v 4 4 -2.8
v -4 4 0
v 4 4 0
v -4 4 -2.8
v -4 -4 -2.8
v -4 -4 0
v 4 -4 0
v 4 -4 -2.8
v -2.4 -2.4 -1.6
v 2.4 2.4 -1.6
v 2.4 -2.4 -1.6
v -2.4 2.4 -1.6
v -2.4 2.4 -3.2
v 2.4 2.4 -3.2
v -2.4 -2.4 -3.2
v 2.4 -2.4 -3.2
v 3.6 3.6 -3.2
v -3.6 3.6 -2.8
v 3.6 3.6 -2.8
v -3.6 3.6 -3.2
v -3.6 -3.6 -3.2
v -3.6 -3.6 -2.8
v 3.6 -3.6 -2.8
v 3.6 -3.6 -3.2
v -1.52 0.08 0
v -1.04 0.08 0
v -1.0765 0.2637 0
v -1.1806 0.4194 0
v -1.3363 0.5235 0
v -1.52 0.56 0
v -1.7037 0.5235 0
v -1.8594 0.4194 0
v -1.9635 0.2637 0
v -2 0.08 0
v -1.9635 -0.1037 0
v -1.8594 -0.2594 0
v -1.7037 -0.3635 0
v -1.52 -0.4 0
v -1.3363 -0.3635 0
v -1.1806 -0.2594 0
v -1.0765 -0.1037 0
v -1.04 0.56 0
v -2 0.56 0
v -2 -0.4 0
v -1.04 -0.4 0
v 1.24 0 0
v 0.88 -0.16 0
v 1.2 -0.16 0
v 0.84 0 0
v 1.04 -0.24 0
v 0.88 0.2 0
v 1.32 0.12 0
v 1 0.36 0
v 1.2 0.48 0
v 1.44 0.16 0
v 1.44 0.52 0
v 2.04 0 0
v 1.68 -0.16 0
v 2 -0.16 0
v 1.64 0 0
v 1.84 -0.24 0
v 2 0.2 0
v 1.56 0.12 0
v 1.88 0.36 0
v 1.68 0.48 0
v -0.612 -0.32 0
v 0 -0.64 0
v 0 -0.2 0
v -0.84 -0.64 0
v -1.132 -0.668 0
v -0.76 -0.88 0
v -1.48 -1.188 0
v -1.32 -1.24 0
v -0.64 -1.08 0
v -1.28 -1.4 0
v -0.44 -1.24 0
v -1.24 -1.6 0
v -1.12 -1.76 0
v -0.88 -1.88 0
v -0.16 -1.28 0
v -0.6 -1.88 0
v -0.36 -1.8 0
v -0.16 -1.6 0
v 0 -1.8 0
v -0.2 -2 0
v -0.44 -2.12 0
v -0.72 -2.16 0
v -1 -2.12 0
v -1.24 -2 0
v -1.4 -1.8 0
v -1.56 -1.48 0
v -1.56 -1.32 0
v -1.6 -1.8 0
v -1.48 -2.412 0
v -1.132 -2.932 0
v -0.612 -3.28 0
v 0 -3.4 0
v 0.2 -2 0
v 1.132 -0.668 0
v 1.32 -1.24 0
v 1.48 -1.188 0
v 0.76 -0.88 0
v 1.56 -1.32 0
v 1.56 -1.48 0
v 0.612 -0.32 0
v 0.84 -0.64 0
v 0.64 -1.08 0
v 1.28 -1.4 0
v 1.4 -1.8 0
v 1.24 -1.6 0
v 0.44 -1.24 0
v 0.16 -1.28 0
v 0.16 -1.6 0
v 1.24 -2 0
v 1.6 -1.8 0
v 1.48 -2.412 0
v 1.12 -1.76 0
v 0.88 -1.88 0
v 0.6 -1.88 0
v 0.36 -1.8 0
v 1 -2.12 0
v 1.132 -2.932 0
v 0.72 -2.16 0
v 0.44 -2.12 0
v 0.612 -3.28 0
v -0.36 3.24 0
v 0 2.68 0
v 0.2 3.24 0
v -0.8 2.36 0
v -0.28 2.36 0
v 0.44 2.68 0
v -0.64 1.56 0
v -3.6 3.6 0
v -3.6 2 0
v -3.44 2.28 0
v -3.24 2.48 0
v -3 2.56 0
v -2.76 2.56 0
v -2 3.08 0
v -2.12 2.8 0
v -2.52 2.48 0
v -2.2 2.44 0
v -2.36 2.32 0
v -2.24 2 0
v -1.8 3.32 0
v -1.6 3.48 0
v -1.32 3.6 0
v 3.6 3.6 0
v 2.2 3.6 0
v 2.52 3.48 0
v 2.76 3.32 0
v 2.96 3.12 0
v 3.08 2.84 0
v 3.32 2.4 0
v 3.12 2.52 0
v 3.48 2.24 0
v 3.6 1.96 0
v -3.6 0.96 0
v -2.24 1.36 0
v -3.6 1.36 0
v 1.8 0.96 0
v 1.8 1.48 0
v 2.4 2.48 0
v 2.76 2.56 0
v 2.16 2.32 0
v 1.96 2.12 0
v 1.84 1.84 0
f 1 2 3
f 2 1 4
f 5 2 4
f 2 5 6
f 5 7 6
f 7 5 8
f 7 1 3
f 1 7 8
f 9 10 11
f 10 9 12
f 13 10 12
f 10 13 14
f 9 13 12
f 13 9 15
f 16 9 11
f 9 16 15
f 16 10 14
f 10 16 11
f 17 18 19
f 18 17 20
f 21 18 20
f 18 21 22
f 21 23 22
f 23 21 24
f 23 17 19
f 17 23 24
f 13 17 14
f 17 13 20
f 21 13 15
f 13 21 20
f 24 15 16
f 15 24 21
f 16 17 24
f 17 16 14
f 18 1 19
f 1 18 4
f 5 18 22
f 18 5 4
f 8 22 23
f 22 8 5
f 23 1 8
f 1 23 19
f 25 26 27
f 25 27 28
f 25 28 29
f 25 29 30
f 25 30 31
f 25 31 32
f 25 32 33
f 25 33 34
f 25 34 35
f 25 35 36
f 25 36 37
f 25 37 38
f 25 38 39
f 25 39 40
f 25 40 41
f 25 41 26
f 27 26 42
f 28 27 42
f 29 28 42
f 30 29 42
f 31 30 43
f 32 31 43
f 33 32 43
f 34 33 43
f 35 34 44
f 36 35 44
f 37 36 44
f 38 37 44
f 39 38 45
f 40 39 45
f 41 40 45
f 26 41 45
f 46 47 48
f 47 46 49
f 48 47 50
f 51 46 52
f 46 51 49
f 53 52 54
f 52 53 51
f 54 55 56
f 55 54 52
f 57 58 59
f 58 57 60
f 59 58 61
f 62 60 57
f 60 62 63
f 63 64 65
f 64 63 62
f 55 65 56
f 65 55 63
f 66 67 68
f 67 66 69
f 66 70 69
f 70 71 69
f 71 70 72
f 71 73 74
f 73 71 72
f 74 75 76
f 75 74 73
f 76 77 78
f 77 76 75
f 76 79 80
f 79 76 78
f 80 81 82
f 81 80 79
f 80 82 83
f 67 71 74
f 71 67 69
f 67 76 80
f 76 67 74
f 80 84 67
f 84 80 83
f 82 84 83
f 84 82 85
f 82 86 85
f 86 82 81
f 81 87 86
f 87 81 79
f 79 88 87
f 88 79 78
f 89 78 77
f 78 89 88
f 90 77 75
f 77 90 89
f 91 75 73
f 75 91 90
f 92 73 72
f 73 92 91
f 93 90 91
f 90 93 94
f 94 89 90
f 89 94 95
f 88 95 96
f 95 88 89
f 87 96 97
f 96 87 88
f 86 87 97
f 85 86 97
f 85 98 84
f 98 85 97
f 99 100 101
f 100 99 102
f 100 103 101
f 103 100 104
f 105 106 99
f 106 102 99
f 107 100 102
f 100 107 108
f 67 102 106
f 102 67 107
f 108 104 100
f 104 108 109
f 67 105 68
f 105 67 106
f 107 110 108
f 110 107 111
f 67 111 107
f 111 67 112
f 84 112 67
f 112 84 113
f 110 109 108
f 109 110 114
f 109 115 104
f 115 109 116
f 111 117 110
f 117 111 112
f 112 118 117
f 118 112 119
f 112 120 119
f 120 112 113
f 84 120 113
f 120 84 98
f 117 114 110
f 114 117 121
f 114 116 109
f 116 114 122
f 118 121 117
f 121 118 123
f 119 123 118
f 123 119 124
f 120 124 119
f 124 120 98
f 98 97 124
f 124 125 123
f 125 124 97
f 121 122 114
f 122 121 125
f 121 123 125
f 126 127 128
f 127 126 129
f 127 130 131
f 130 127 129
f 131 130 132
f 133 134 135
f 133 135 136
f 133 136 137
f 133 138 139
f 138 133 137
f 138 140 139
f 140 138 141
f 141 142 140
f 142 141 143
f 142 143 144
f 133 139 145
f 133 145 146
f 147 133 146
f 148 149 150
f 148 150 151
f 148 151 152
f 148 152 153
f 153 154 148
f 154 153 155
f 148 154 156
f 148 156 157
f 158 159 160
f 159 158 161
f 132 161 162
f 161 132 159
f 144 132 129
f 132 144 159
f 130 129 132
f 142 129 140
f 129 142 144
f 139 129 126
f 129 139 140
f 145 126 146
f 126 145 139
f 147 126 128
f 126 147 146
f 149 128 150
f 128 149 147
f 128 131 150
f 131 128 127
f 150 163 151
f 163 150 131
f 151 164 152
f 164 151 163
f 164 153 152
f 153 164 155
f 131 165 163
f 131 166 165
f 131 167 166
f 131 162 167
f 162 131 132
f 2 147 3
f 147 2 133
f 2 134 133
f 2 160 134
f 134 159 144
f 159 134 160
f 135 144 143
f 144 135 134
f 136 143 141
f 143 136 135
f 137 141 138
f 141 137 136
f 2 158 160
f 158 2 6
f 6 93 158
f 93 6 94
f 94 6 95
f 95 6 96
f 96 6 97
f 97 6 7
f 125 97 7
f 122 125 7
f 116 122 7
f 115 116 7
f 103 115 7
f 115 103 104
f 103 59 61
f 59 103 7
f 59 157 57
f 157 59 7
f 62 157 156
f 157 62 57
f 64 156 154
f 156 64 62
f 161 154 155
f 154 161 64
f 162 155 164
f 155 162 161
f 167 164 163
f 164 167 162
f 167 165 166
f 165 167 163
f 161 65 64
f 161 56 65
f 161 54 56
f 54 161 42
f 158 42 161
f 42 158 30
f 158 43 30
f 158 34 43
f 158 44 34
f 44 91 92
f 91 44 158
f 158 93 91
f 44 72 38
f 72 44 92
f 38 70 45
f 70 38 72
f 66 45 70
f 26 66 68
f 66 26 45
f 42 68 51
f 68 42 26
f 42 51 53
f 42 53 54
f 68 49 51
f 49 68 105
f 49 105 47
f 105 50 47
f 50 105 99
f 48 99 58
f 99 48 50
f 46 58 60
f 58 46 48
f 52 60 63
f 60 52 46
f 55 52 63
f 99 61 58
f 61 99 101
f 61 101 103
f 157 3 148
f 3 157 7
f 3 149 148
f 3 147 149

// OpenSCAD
// file: ../p/box5.scad
use <../lib.scad>
function ldraw_lib__box5() = [
// 0 Box with 5 Faces and All Edges
// 0 Name: box5.dat
// 0 Author: James Jessiman
// 0 !LDRAW_ORG Primitive UPDATE 2012-01
// 0 !LICENSE Licensed under CC BY 4.0 : see CAreadme.txt
// 
// 0 BFC CERTIFY CCW
  [0,"BFC","CERTIFY"],
  [0,"BFC","CCW"],
// 
// 0 !HISTORY 2002-04-03 [sbliss] Modified for BFC compliance
// 0 !HISTORY 2002-04-25 [PTadmin] Official Update 2002-02
// 0 !HISTORY 2007-06-24 [PTadmin] Header formatted for Contributor Agreement
// 0 !HISTORY 2008-07-01 [PTadmin] Official Update 2008-01
// 0 !HISTORY 2012-02-16 [Philo] Changed to CCW
// 0 !HISTORY 2012-03-30 [PTadmin] Official Update 2012-01
// 
// 
// 2 24 1 1 1 -1 1 1
  [2,24,1,1,1,-1,1,1],
// 2 24 -1 1 1 -1 1 -1
  [2,24,-1,1,1,-1,1,-1],
// 2 24 -1 1 -1 1 1 -1
  [2,24,-1,1,-1,1,1,-1],
// 2 24 1 1 -1 1 1 1
  [2,24,1,1,-1,1,1,1],
// 2 24 1 0 1 -1 0 1
  [2,24,1,0,1,-1,0,1],
// 2 24 -1 0 1 -1 0 -1
  [2,24,-1,0,1,-1,0,-1],
// 2 24 -1 0 -1 1 0 -1
  [2,24,-1,0,-1,1,0,-1],
// 2 24 1 0 -1 1 0 1
  [2,24,1,0,-1,1,0,1],
// 2 24 1 0 1 1 1 1
  [2,24,1,0,1,1,1,1],
// 2 24 -1 0 1 -1 1 1
  [2,24,-1,0,1,-1,1,1],
// 2 24 1 0 -1 1 1 -1
  [2,24,1,0,-1,1,1,-1],
// 2 24 -1 0 -1 -1 1 -1
  [2,24,-1,0,-1,-1,1,-1],
// 4 16 -1 1 1 1 1 1 1 1 -1 -1 1 -1
  [4,16,-1,1,1,1,1,1,1,1,-1,-1,1,-1],
// 4 16 -1 1 1 -1 0 1 1 0 1 1 1 1
  [4,16,-1,1,1,-1,0,1,1,0,1,1,1,1],
// 4 16 -1 1 -1 -1 0 -1 -1 0 1 -1 1 1
  [4,16,-1,1,-1,-1,0,-1,-1,0,1,-1,1,1],
// 4 16 1 1 -1 1 0 -1 -1 0 -1 -1 1 -1
  [4,16,1,1,-1,1,0,-1,-1,0,-1,-1,1,-1],
// 4 16 1 1 1 1 0 1 1 0 -1 1 1 -1
  [4,16,1,1,1,1,0,1,1,0,-1,1,1,-1],
];
module ldraw_lib__box5(step=0, col=false, unit=2/5, alt=false, line=0.2, solid=!$preview)
    makepoly(ldraw_lib__box5(), step=step, col=col, unit=unit, alt=alt, line=line, solid=solid);
ldraw_lib__box5(line=0.2);
// file: ../p/box4.scad
use <../lib.scad>
function ldraw_lib__box4() = [
// 0 Box with 4 Faces (2 Parallel Pairs) and All Edges
// 0 Name: box4.dat
// 0 Author: James Jessiman
// 0 !LDRAW_ORG Primitive UPDATE 2012-01
// 0 !LICENSE Licensed under CC BY 4.0 : see CAreadme.txt
// 
// 0 BFC CERTIFY CCW
  [0,"BFC","CERTIFY"],
  [0,"BFC","CCW"],
// 
// 0 !HISTORY 2002-04-03 [sbliss] Modified for BFC compliance
// 0 !HISTORY 2002-04-25 [PTadmin] Official Update 2002-02
// 0 !HISTORY 2007-06-24 [PTadmin] Header formatted for Contributor Agreement
// 0 !HISTORY 2008-07-01 [PTadmin] Official Update 2008-01
// 0 !HISTORY 2012-02-16 [Philo] Changed to CCW
// 0 !HISTORY 2012-03-30 [PTadmin] Official Update 2012-01
// 
// 
// 2 24 1 1 1 -1 1 1
  [2,24,1,1,1,-1,1,1],
// 2 24 -1 1 1 -1 1 -1
  [2,24,-1,1,1,-1,1,-1],
// 2 24 -1 1 -1 1 1 -1
  [2,24,-1,1,-1,1,1,-1],
// 2 24 1 1 -1 1 1 1
  [2,24,1,1,-1,1,1,1],
// 2 24 1 0 1 -1 0 1
  [2,24,1,0,1,-1,0,1],
// 2 24 -1 0 1 -1 0 -1
  [2,24,-1,0,1,-1,0,-1],
// 2 24 -1 0 -1 1 0 -1
  [2,24,-1,0,-1,1,0,-1],
// 2 24 1 0 -1 1 0 1
  [2,24,1,0,-1,1,0,1],
// 2 24 1 0 1 1 1 1
  [2,24,1,0,1,1,1,1],
// 2 24 -1 0 1 -1 1 1
  [2,24,-1,0,1,-1,1,1],
// 2 24 1 0 -1 1 1 -1
  [2,24,1,0,-1,1,1,-1],
// 2 24 -1 0 -1 -1 1 -1
  [2,24,-1,0,-1,-1,1,-1],
// 4 16 -1 1 1 -1 0 1 1 0 1 1 1 1
  [4,16,-1,1,1,-1,0,1,1,0,1,1,1,1],
// 4 16 -1 1 -1 -1 0 -1 -1 0 1 -1 1 1
  [4,16,-1,1,-1,-1,0,-1,-1,0,1,-1,1,1],
// 4 16 1 1 -1 1 0 -1 -1 0 -1 -1 1 -1
  [4,16,1,1,-1,1,0,-1,-1,0,-1,-1,1,-1],
// 4 16 1 1 1 1 0 1 1 0 -1 1 1 -1
  [4,16,1,1,1,1,0,1,1,0,-1,1,1,-1],
];
module ldraw_lib__box4(step=0, col=false, unit=2/5, alt=false, line=0.2, solid=!$preview)
    makepoly(ldraw_lib__box4(), step=step, col=col, unit=unit, alt=alt, line=line, solid=solid);
ldraw_lib__box4(line=0.2);
// file: s/3070bs01.scad
use <../../lib.scad>
use <../../p/box4.scad>
use <../../p/box5.scad>
function ldraw_lib__s__3070bs01() = [
// 0 ~Tile  1 x  1 with Groove without Top Face
// 0 Name: s\3070bs01.dat
// 0 Author: Chris Dee [cwdee]
// 0 !LDRAW_ORG Subpart UPDATE 2009-02
// 0 !LICENSE Licensed under CC BY 4.0 : see CAreadme.txt
// 
// 0 BFC CERTIFY CCW
  [0,"BFC","CERTIFY"],
  [0,"BFC","CCW"],
// 
// 0 !HISTORY 2009-09-03 [PTadmin] Official Update 2009-02
// 
// 
// 1 16 0 0 0 10 0 0 0 7 0 0 0 10 box4.dat
  [1,16,0,0,0,10,0,0,0,7,0,0,0,10, ldraw_lib__box4()],
// 0 BFC INVERTNEXT
  [0,"BFC","INVERTNEXT"],
// 1 16 0 8 0 6 0 0 0 -4 0 0 0 6 box5.dat
  [1,16,0,8,0,6,0,0,0,-4,0,0,0,6, ldraw_lib__box5()],
// 1 16 0 7 0 9 0 0 0 1 0 0 0 9 box4.dat
  [1,16,0,7,0,9,0,0,0,1,0,0,0,9, ldraw_lib__box4()],
// 
// 4 16 9 8 9 6 8 6 -6 8 6 -9 8 9
  [4,16,9,8,9,6,8,6,-6,8,6,-9,8,9],
// 4 16 -9 8 9 -6 8 6 -6 8 -6 -9 8 -9
  [4,16,-9,8,9,-6,8,6,-6,8,-6,-9,8,-9],
// 4 16 -9 8 -9 -6 8 -6 6 8 -6 9 8 -9
  [4,16,-9,8,-9,-6,8,-6,6,8,-6,9,8,-9],
// 4 16 9 8 -9 6 8 -6 6 8 6 9 8 9
  [4,16,9,8,-9,6,8,-6,6,8,6,9,8,9],
// 
// 4 16 10 7 10 9 7 9 -9 7 9 -10 7 10
  [4,16,10,7,10,9,7,9,-9,7,9,-10,7,10],
// 4 16 -10 7 10 -9 7 9 -9 7 -9 -10 7 -10
  [4,16,-10,7,10,-9,7,9,-9,7,-9,-10,7,-10],
// 4 16 -10 7 -10 -9 7 -9 9 7 -9 10 7 -10
  [4,16,-10,7,-10,-9,7,-9,9,7,-9,10,7,-10],
// 4 16 10 7 -10 9 7 -9 9 7 9 10 7 10
  [4,16,10,7,-10,9,7,-9,9,7,9,10,7,10],
// 0
];
module ldraw_lib__s__3070bs01(step=0, col=false, unit=2/5, alt=false, line=0.2, solid=!$preview)
    makepoly(ldraw_lib__s__3070bs01(), step=step, col=col, unit=unit, alt=alt, line=line, solid=solid);
ldraw_lib__s__3070bs01(line=0.2);
// file: ../p/4-4ndis.scad
use <../lib.scad>
function ldraw_lib__4_4ndis() = [
// 0 Disc Negative 1.0
// 0 Name: 4-4ndis.dat
// 0 Author: James Jessiman
// 0 !LDRAW_ORG Primitive UPDATE 2012-01
// 0 !LICENSE Licensed under CC BY 4.0 : see CAreadme.txt
// 
// 0 BFC CERTIFY CCW
  [0,"BFC","CERTIFY"],
  [0,"BFC","CCW"],
// 
// 0 !HISTORY 2002-03-23 [sbliss] Added BFC statement; compacted code
// 0 !HISTORY 2002-04-25 [PTadmin] Official Update 2002-02
// 0 !HISTORY 2007-06-24 [PTadmin] Header formatted for Contributor Agreement
// 0 !HISTORY 2008-07-01 [PTadmin] Official Update 2008-01
// 0 !HISTORY 2012-02-16 [Philo] Changed to CCW
// 0 !HISTORY 2012-03-30 [PTadmin] Official Update 2012-01
// 
// 
// 3 16 0.9239 0 0.3827 1 0 0 1 0 1
  [3,16,0.9239,0,0.3827,1,0,0,1,0,1],
// 3 16 0.7071 0 0.7071 0.9239 0 0.3827 1 0 1
  [3,16,0.7071,0,0.7071,0.9239,0,0.3827,1,0,1],
// 3 16 0.3827 0 0.9239 0.7071 0 0.7071 1 0 1
  [3,16,0.3827,0,0.9239,0.7071,0,0.7071,1,0,1],
// 3 16 0 0 1 0.3827 0 0.9239 1 0 1
  [3,16,0,0,1,0.3827,0,0.9239,1,0,1],
// 3 16 -0.3827 0 0.9239 0 0 1 -1 0 1
  [3,16,-0.3827,0,0.9239,0,0,1,-1,0,1],
// 3 16 -0.7071 0 0.7071 -0.3827 0 0.9239 -1 0 1
  [3,16,-0.7071,0,0.7071,-0.3827,0,0.9239,-1,0,1],
// 3 16 -0.9239 0 0.3827 -0.7071 0 0.7071 -1 0 1
  [3,16,-0.9239,0,0.3827,-0.7071,0,0.7071,-1,0,1],
// 3 16 -1 0 0 -0.9239 0 0.3827 -1 0 1
  [3,16,-1,0,0,-0.9239,0,0.3827,-1,0,1],
// 3 16 -0.9239 0 -0.3827 -1 0 0 -1 0 -1
  [3,16,-0.9239,0,-0.3827,-1,0,0,-1,0,-1],
// 3 16 -0.7071 0 -0.7071 -0.9239 0 -0.3827 -1 0 -1
  [3,16,-0.7071,0,-0.7071,-0.9239,0,-0.3827,-1,0,-1],
// 3 16 -0.3827 0 -0.9239 -0.7071 0 -0.7071 -1 0 -1
  [3,16,-0.3827,0,-0.9239,-0.7071,0,-0.7071,-1,0,-1],
// 3 16 0 0 -1 -0.3827 0 -0.9239 -1 0 -1
  [3,16,0,0,-1,-0.3827,0,-0.9239,-1,0,-1],
// 3 16 0.3827 0 -0.9239 0 0 -1 1 0 -1
  [3,16,0.3827,0,-0.9239,0,0,-1,1,0,-1],
// 3 16 0.7071 0 -0.7071 0.3827 0 -0.9239 1 0 -1
  [3,16,0.7071,0,-0.7071,0.3827,0,-0.9239,1,0,-1],
// 3 16 0.9239 0 -0.3827 0.7071 0 -0.7071 1 0 -1
  [3,16,0.9239,0,-0.3827,0.7071,0,-0.7071,1,0,-1],
// 3 16 1 0 0 0.9239 0 -0.3827 1 0 -1
  [3,16,1,0,0,0.9239,0,-0.3827,1,0,-1],
];
module ldraw_lib__4_4ndis(step=0, col=false, unit=2/5, alt=false, line=0.2, solid=!$preview)
    makepoly(ldraw_lib__4_4ndis(), step=step, col=col, unit=unit, alt=alt, line=line, solid=solid);
ldraw_lib__4_4ndis(line=0.2);
// file: ../p/4-4disc.scad
use <../lib.scad>
function ldraw_lib__4_4disc() = [
// 0 Disc 1.0
// 0 Name: 4-4disc.dat
// 0 Author: James Jessiman
// 0 !LDRAW_ORG Primitive UPDATE 2002-02
// 0 !LICENSE Licensed under CC BY 4.0 : see CAreadme.txt
// 
// 0 BFC CERTIFY CCW
  [0,"BFC","CERTIFY"],
  [0,"BFC","CCW"],
// 
// 0 !HISTORY 1998-12-15 [PTadmin] Official Update 1998-10
// 0 !HISTORY 2002-03-23 [sbliss] Added BFC statement
// 0 !HISTORY 2002-04-25 [PTadmin] Official Update 2002-02
// 0 !HISTORY 2007-06-24 [PTadmin] Header formatted for Contributor Agreement
// 0 !HISTORY 2008-07-01 [PTadmin] Official Update 2008-01
// 
// 
// 3 16 0 0 0 1 0 0 0.9239 0 0.3827
  [3,16,0,0,0,1,0,0,0.9239,0,0.3827],
// 3 16 0 0 0 0.9239 0 0.3827 0.7071 0 0.7071
  [3,16,0,0,0,0.9239,0,0.3827,0.7071,0,0.7071],
// 3 16 0 0 0 0.7071 0 0.7071 0.3827 0 0.9239
  [3,16,0,0,0,0.7071,0,0.7071,0.3827,0,0.9239],
// 3 16 0 0 0 0.3827 0 0.9239 0 0 1
  [3,16,0,0,0,0.3827,0,0.9239,0,0,1],
// 3 16 0 0 0 0 0 1 -0.3827 0 0.9239
  [3,16,0,0,0,0,0,1,-0.3827,0,0.9239],
// 3 16 0 0 0 -0.3827 0 0.9239 -0.7071 0 0.7071
  [3,16,0,0,0,-0.3827,0,0.9239,-0.7071,0,0.7071],
// 3 16 0 0 0 -0.7071 0 0.7071 -0.9239 0 0.3827
  [3,16,0,0,0,-0.7071,0,0.7071,-0.9239,0,0.3827],
// 3 16 0 0 0 -0.9239 0 0.3827 -1 0 -0
  [3,16,0,0,0,-0.9239,0,0.3827,-1,0,-0],
// 3 16 0 0 0 -1 0 -0 -0.9239 0 -0.3827
  [3,16,0,0,0,-1,0,-0,-0.9239,0,-0.3827],
// 3 16 0 0 0 -0.9239 0 -0.3827 -0.7071 0 -0.7071
  [3,16,0,0,0,-0.9239,0,-0.3827,-0.7071,0,-0.7071],
// 3 16 0 0 0 -0.7071 0 -0.7071 -0.3827 0 -0.9239
  [3,16,0,0,0,-0.7071,0,-0.7071,-0.3827,0,-0.9239],
// 3 16 0 0 0 -0.3827 0 -0.9239 0 0 -1
  [3,16,0,0,0,-0.3827,0,-0.9239,0,0,-1],
// 3 16 0 0 0 0 0 -1 0.3827 0 -0.9239
  [3,16,0,0,0,0,0,-1,0.3827,0,-0.9239],
// 3 16 0 0 0 0.3827 0 -0.9239 0.7071 0 -0.7071
  [3,16,0,0,0,0.3827,0,-0.9239,0.7071,0,-0.7071],
// 3 16 0 0 0 0.7071 0 -0.7071 0.9239 0 -0.3827
  [3,16,0,0,0,0.7071,0,-0.7071,0.9239,0,-0.3827],
// 3 16 0 0 0 0.9239 0 -0.3827 1 0 0
  [3,16,0,0,0,0.9239,0,-0.3827,1,0,0],
// 0
];
module ldraw_lib__4_4disc(step=0, col=false, unit=2/5, alt=false, line=0.2, solid=!$preview)
    makepoly(ldraw_lib__4_4disc(), step=step, col=col, unit=unit, alt=alt, line=line, solid=solid);
ldraw_lib__4_4disc(line=0.2);
// main file
use <../lib.scad>
use <../p/4-4disc.scad>
use <../p/4-4ndis.scad>
use <s/3070bs01.scad>
function ldraw_lib__3070bp1g() = [
// 0 Tile  1 x  1 with Winking Bear Face, Bright Light Orange Cap and Coral Lightning Bolt Pattern
// 0 Name: 3070bp1g.dat
// 0 Author: Takeshi Takahashi [RainbowDolphin]
// 0 !LDRAW_ORG Part UPDATE 2025-07
// 0 !LICENSE Licensed under CC BY 4.0 : see CAreadme.txt
// 
// 0 BFC CERTIFY CCW
  [0,"BFC","CERTIFY"],
  [0,"BFC","CCW"],
// 
// 0 !KEYWORDS Adventure Bracelets, BrickLink 3070pb204, Dots
// 0 !KEYWORDS Rebrickable 3070bpr0224, Set 41918
// 
// 0 !HISTORY 2025-07-27 [OrionP] Official Update 2025-07
// 
// 
// 1 16 0 0 0 1 0 0 0 1 0 0 0 1 s\3070bs01.dat
  [1,16,0,0,0,1,0,0,0,1,0,0,0,1, ldraw_lib__s__3070bs01()],
// 1 0 -3.8 0 0.2 1.2 0 0 0 1 0 0 0 1.2 4-4disc.dat
  [1,0,-3.8,0,0.2,1.2,0,0,0,1,0,0,0,1.2, ldraw_lib__4_4disc()],
// 1 16 -3.8 0 0.2 1.2 0 0 0 1 0 0 0 1.2 4-4ndis.dat
  [1,16,-3.8,0,0.2,1.2,0,0,0,1,0,0,0,1.2, ldraw_lib__4_4ndis()],
// 4 0 3.1 0 0 2.1 0 0 2.2 0 -0.4 3 0 -0.4
  [4,0,3.1,0,0,2.1,0,0,2.2,0,-0.4,3,0,-0.4],
// 3 0 3 0 -0.4 2.2 0 -0.4 2.6 0 -0.6
  [3,0,3,0,-0.4,2.2,0,-0.4,2.6,0,-0.6],
// 4 0 2.2 0 0.5 2.1 0 0 3.1 0 0 3.3 0 0.3
  [4,0,2.2,0,0.5,2.1,0,0,3.1,0,0,3.3,0,0.3],
// 4 0 2.5 0 0.9 2.2 0 0.5 3.3 0 0.3 3 0 1.2
  [4,0,2.5,0,0.9,2.2,0,0.5,3.3,0,0.3,3,0,1.2],
// 4 0 3 0 1.2 3.3 0 0.3 3.6 0 0.4 3.6 0 1.3
  [4,0,3,0,1.2,3.3,0,0.3,3.6,0,0.4,3.6,0,1.3],
// 4 0 5 0 -0.4 5.1 0 0 4.1 0 0 4.2 0 -0.4
  [4,0,5,0,-0.4,5.1,0,0,4.1,0,0,4.2,0,-0.4],
// 3 0 5 0 -0.4 4.2 0 -0.4 4.6 0 -0.6
  [3,0,5,0,-0.4,4.2,0,-0.4,4.6,0,-0.6],
// 4 0 4.1 0 0 5.1 0 0 5 0 0.5 3.9 0 0.3
  [4,0,4.1,0,0,5.1,0,0,5,0,0.5,3.9,0,0.3],
// 4 0 3.9 0 0.3 5 0 0.5 4.7 0 0.9 4.2 0 1.2
  [4,0,3.9,0,0.3,5,0,0.5,4.7,0,0.9,4.2,0,1.2],
// 4 0 3.6 0 0.4 3.9 0 0.3 4.2 0 1.2 3.6 0 1.3
  [4,0,3.6,0,0.4,3.9,0,0.3,4.2,0,1.2,3.6,0,1.3],
// 4 15 0 0 -1.6 0 0 -0.5 -1.53 0 -0.8 -2.1 0 -1.6
  [4,15,0,0,-1.6,0,0,-0.5,-1.53,0,-0.8,-2.1,0,-1.6],
// 3 15 -1.53 0 -0.8 -2.83 0 -1.67 -2.1 0 -1.6
  [3,15,-1.53,0,-0.8,-2.83,0,-1.67,-2.1,0,-1.6],
// 4 15 -1.9 0 -2.2 -2.1 0 -1.6 -2.83 0 -1.67 -3.7 0 -2.97
  [4,15,-1.9,0,-2.2,-2.1,0,-1.6,-2.83,0,-1.67,-3.7,0,-2.97],
// 4 15 -1.9 0 -2.2 -3.7 0 -2.97 -3.3 0 -3.1 -1.6 0 -2.7
  [4,15,-1.9,0,-2.2,-3.7,0,-2.97,-3.3,0,-3.1,-1.6,0,-2.7],
// 4 15 -1.6 0 -2.7 -3.3 0 -3.1 -3.2 0 -3.5 -1.1 0 -3.1
  [4,15,-1.6,0,-2.7,-3.3,0,-3.1,-3.2,0,-3.5,-1.1,0,-3.1],
// 4 15 -1.1 0 -3.1 -3.2 0 -3.5 -3.1 0 -4 -2.8 0 -4.4
  [4,15,-1.1,0,-3.1,-3.2,0,-3.5,-3.1,0,-4,-2.8,0,-4.4],
// 4 15 -0.4 0 -3.2 -1.1 0 -3.1 -2.8 0 -4.4 -2.2 0 -4.7
  [4,15,-0.4,0,-3.2,-1.1,0,-3.1,-2.8,0,-4.4,-2.2,0,-4.7],
// 4 15 -0.4 0 -3.2 -2.2 0 -4.7 -1.5 0 -4.7 -0.9 0 -4.5
  [4,15,-0.4,0,-3.2,-2.2,0,-4.7,-1.5,0,-4.7,-0.9,0,-4.5],
// 3 15 -0.4 0 -3.2 -0.9 0 -4.5 -0.4 0 -4
  [3,15,-0.4,0,-3.2,-0.9,0,-4.5,-0.4,0,-4],
// 4 0 0 0 -1.6 -2.1 0 -1.6 -1.9 0 -2.2 -1.6 0 -2.7
  [4,0,0,0,-1.6,-2.1,0,-1.6,-1.9,0,-2.2,-1.6,0,-2.7],
// 4 0 0 0 -1.6 -1.6 0 -2.7 -1.1 0 -3.1 -0.4 0 -3.2
  [4,0,0,0,-1.6,-1.6,0,-2.7,-1.1,0,-3.1,-0.4,0,-3.2],
// 4 0 0 0 -1.6 -0.4 0 -3.2 -0.4 0 -4 0 0 -4.5
  [4,0,0,0,-1.6,-0.4,0,-3.2,-0.4,0,-4,0,0,-4.5],
// 4 0 0 0 -4.5 -0.4 0 -4 -0.9 0 -4.5 -0.5 0 -5
  [4,0,0,0,-4.5,-0.4,0,-4,-0.9,0,-4.5,-0.5,0,-5],
// 4 0 -0.5 0 -5 -0.9 0 -4.5 -1.5 0 -4.7 -1.1 0 -5.3
  [4,0,-0.5,0,-5,-0.9,0,-4.5,-1.5,0,-4.7,-1.1,0,-5.3],
// 4 0 -1.8 0 -5.4 -1.1 0 -5.3 -1.5 0 -4.7 -2.2 0 -4.7
  [4,0,-1.8,0,-5.4,-1.1,0,-5.3,-1.5,0,-4.7,-2.2,0,-4.7],
// 4 0 -2.5 0 -5.3 -1.8 0 -5.4 -2.2 0 -4.7 -2.8 0 -4.4
  [4,0,-2.5,0,-5.3,-1.8,0,-5.4,-2.2,0,-4.7,-2.8,0,-4.4],
// 4 0 -3.1 0 -5 -2.5 0 -5.3 -2.8 0 -4.4 -3.1 0 -4
  [4,0,-3.1,0,-5,-2.5,0,-5.3,-2.8,0,-4.4,-3.1,0,-4],
// 4 0 -3.5 0 -4.5 -3.1 0 -5 -3.1 0 -4 -3.2 0 -3.5
  [4,0,-3.5,0,-4.5,-3.1,0,-5,-3.1,0,-4,-3.2,0,-3.5],
// 4 0 -3.9 0 -3.7 -3.5 0 -4.5 -3.2 0 -3.5 -3.3 0 -3.1
  [4,0,-3.9,0,-3.7,-3.5,0,-4.5,-3.2,0,-3.5,-3.3,0,-3.1],
// 4 0 -3.9 0 -3.3 -3.9 0 -3.7 -3.3 0 -3.1 -3.7 0 -2.97
  [4,0,-3.9,0,-3.3,-3.9,0,-3.7,-3.3,0,-3.1,-3.7,0,-2.97],
// 4 15 -3.5 0 -4.5 -3.9 0 -3.7 -4 0 -4.5 -3.7 0 -6.03
  [4,15,-3.5,0,-4.5,-3.9,0,-3.7,-4,0,-4.5,-3.7,0,-6.03],
// 4 15 -3.1 0 -5 -3.5 0 -4.5 -3.7 0 -6.03 -2.83 0 -7.33
  [4,15,-3.1,0,-5,-3.5,0,-4.5,-3.7,0,-6.03,-2.83,0,-7.33],
// 4 15 -2.5 0 -5.3 -3.1 0 -5 -2.83 0 -7.33 -1.53 0 -8.2
  [4,15,-2.5,0,-5.3,-3.1,0,-5,-2.83,0,-7.33,-1.53,0,-8.2],
// 4 15 -1.8 0 -5.4 -2.5 0 -5.3 -1.53 0 -8.2 0 0 -8.5
  [4,15,-1.8,0,-5.4,-2.5,0,-5.3,-1.53,0,-8.2,0,0,-8.5],
// 3 15 -1.1 0 -5.3 -1.8 0 -5.4 0 0 -8.5
  [3,15,-1.1,0,-5.3,-1.8,0,-5.4,0,0,-8.5],
// 3 15 -0.5 0 -5 -1.1 0 -5.3 0 0 -8.5
  [3,15,-0.5,0,-5,-1.1,0,-5.3,0,0,-8.5],
// 4 15 0 0 -4.5 -0.5 0 -5 0 0 -8.5 0.5 0 -5
  [4,15,0,0,-4.5,-0.5,0,-5,0,0,-8.5,0.5,0,-5],
// 4 15 3.7 0 -2.97 2.83 0 -1.67 1.9 0 -2.2 3.3 0 -3.1
  [4,15,3.7,0,-2.97,2.83,0,-1.67,1.9,0,-2.2,3.3,0,-3.1],
// 4 0 3.9 0 -3.3 3.7 0 -2.97 3.3 0 -3.1 3.9 0 -3.7
  [4,0,3.9,0,-3.3,3.7,0,-2.97,3.3,0,-3.1,3.9,0,-3.7],
// 3 15 1.53 0 -0.8 2.1 0 -1.6 2.83 0 -1.67
  [3,15,1.53,0,-0.8,2.1,0,-1.6,2.83,0,-1.67],
// 3 15 2.1 0 -1.6 1.9 0 -2.2 2.83 0 -1.67
  [3,15,2.1,0,-1.6,1.9,0,-2.2,2.83,0,-1.67],
// 4 15 3.3 0 -3.1 1.9 0 -2.2 1.6 0 -2.7 3.2 0 -3.5
  [4,15,3.3,0,-3.1,1.9,0,-2.2,1.6,0,-2.7,3.2,0,-3.5],
// 4 0 1.9 0 -2.2 2.1 0 -1.6 0 0 -1.6 1.6 0 -2.7
  [4,0,1.9,0,-2.2,2.1,0,-1.6,0,0,-1.6,1.6,0,-2.7],
// 4 0 3.9 0 -3.7 3.3 0 -3.1 3.2 0 -3.5 3.5 0 -4.5
  [4,0,3.9,0,-3.7,3.3,0,-3.1,3.2,0,-3.5,3.5,0,-4.5],
// 4 15 0 0 -1.6 2.1 0 -1.6 1.53 0 -0.8 0 0 -0.5
  [4,15,0,0,-1.6,2.1,0,-1.6,1.53,0,-0.8,0,0,-0.5],
// 4 15 3.2 0 -3.5 1.6 0 -2.7 1.1 0 -3.1 3.1 0 -4
  [4,15,3.2,0,-3.5,1.6,0,-2.7,1.1,0,-3.1,3.1,0,-4],
// 4 0 1.1 0 -3.1 1.6 0 -2.7 0 0 -1.6 0.4 0 -3.2
  [4,0,1.1,0,-3.1,1.6,0,-2.7,0,0,-1.6,0.4,0,-3.2],
// 4 0 0.4 0 -4 0.4 0 -3.2 0 0 -1.6 0 0 -4.5
  [4,0,0.4,0,-4,0.4,0,-3.2,0,0,-1.6,0,0,-4.5],
// 4 0 3.5 0 -4.5 3.2 0 -3.5 3.1 0 -4 3.1 0 -5
  [4,0,3.5,0,-4.5,3.2,0,-3.5,3.1,0,-4,3.1,0,-5],
// 4 15 4 0 -4.5 3.9 0 -3.7 3.5 0 -4.5 3.7 0 -6.03
  [4,15,4,0,-4.5,3.9,0,-3.7,3.5,0,-4.5,3.7,0,-6.03],
// 4 15 2.8 0 -4.4 3.1 0 -4 1.1 0 -3.1 0.4 0 -3.2
  [4,15,2.8,0,-4.4,3.1,0,-4,1.1,0,-3.1,0.4,0,-3.2],
// 4 15 2.2 0 -4.7 2.8 0 -4.4 0.4 0 -3.2 1.5 0 -4.7
  [4,15,2.2,0,-4.7,2.8,0,-4.4,0.4,0,-3.2,1.5,0,-4.7],
// 4 15 0.9 0 -4.5 1.5 0 -4.7 0.4 0 -3.2 0.4 0 -4
  [4,15,0.9,0,-4.5,1.5,0,-4.7,0.4,0,-3.2,0.4,0,-4],
// 4 0 0.9 0 -4.5 0.4 0 -4 0 0 -4.5 0.5 0 -5
  [4,0,0.9,0,-4.5,0.4,0,-4,0,0,-4.5,0.5,0,-5],
// 4 0 3.1 0 -5 3.1 0 -4 2.8 0 -4.4 2.5 0 -5.3
  [4,0,3.1,0,-5,3.1,0,-4,2.8,0,-4.4,2.5,0,-5.3],
// 4 15 3.7 0 -6.03 3.5 0 -4.5 3.1 0 -5 2.83 0 -7.33
  [4,15,3.7,0,-6.03,3.5,0,-4.5,3.1,0,-5,2.83,0,-7.33],
// 4 0 2.5 0 -5.3 2.8 0 -4.4 2.2 0 -4.7 1.8 0 -5.4
  [4,0,2.5,0,-5.3,2.8,0,-4.4,2.2,0,-4.7,1.8,0,-5.4],
// 4 0 1.8 0 -5.4 2.2 0 -4.7 1.5 0 -4.7 1.1 0 -5.3
  [4,0,1.8,0,-5.4,2.2,0,-4.7,1.5,0,-4.7,1.1,0,-5.3],
// 4 0 1.5 0 -4.7 0.9 0 -4.5 0.5 0 -5 1.1 0 -5.3
  [4,0,1.5,0,-4.7,0.9,0,-4.5,0.5,0,-5,1.1,0,-5.3],
// 3 15 0.5 0 -5 0 0 -8.5 1.1 0 -5.3
  [3,15,0.5,0,-5,0,0,-8.5,1.1,0,-5.3],
// 4 15 0 0 -8.5 1.53 0 -8.2 1.8 0 -5.4 1.1 0 -5.3
  [4,15,0,0,-8.5,1.53,0,-8.2,1.8,0,-5.4,1.1,0,-5.3],
// 4 15 2.83 0 -7.33 3.1 0 -5 2.5 0 -5.3 1.53 0 -8.2
  [4,15,2.83,0,-7.33,3.1,0,-5,2.5,0,-5.3,1.53,0,-8.2],
// 3 15 2.5 0 -5.3 1.8 0 -5.4 1.53 0 -8.2
  [3,15,2.5,0,-5.3,1.8,0,-5.4,1.53,0,-8.2],
// 4 353 0 0 6.7 0.5 0 8.1 -0.9 0 8.1 -2 0 5.9
  [4,353,0,0,6.7,0.5,0,8.1,-0.9,0,8.1,-2,0,5.9],
// 4 353 0 0 6.7 -2 0 5.9 -0.7 0 5.9 1.1 0 6.7
  [4,353,0,0,6.7,-2,0,5.9,-0.7,0,5.9,1.1,0,6.7],
// 3 353 1.1 0 6.7 -0.7 0 5.9 -1.6 0 3.9
  [3,353,1.1,0,6.7,-0.7,0,5.9,-1.6,0,3.9],
// 3 353 -9 0 9 -9 0 5 -8.6 0 5.7
  [3,353,-9,0,9,-9,0,5,-8.6,0,5.7],
// 3 353 -9 0 9 -8.6 0 5.7 -8.1 0 6.2
  [3,353,-9,0,9,-8.6,0,5.7,-8.1,0,6.2],
// 3 353 -9 0 9 -8.1 0 6.2 -7.5 0 6.4
  [3,353,-9,0,9,-8.1,0,6.2,-7.5,0,6.4],
// 4 353 -9 0 9 -7.5 0 6.4 -6.9 0 6.4 -5 0 7.7
  [4,353,-9,0,9,-7.5,0,6.4,-6.9,0,6.4,-5,0,7.7],
// 4 353 -5.3 0 7 -5 0 7.7 -6.9 0 6.4 -6.3 0 6.2
  [4,353,-5.3,0,7,-5,0,7.7,-6.9,0,6.4,-6.3,0,6.2],
// 4 353 -5.5 0 6.1 -5.3 0 7 -6.3 0 6.2 -5.9 0 5.8
  [4,353,-5.5,0,6.1,-5.3,0,7,-6.3,0,6.2,-5.9,0,5.8],
// 3 353 -5.5 0 6.1 -5.9 0 5.8 -5.6 0 5
  [3,353,-5.5,0,6.1,-5.9,0,5.8,-5.6,0,5],
// 3 353 -9 0 9 -5 0 7.7 -4.5 0 8.3
  [3,353,-9,0,9,-5,0,7.7,-4.5,0,8.3],
// 3 353 -9 0 9 -4.5 0 8.3 -4 0 8.7
  [3,353,-9,0,9,-4.5,0,8.3,-4,0,8.7],
// 3 353 -3.3 0 9 -9 0 9 -4 0 8.7
  [3,353,-3.3,0,9,-9,0,9,-4,0,8.7],
// 3 353 9 0 9 5.5 0 9 6.3 0 8.7
  [3,353,9,0,9,5.5,0,9,6.3,0,8.7],
// 3 353 9 0 9 6.3 0 8.7 6.9 0 8.3
  [3,353,9,0,9,6.3,0,8.7,6.9,0,8.3],
// 3 353 9 0 9 6.9 0 8.3 7.4 0 7.8
  [3,353,9,0,9,6.9,0,8.3,7.4,0,7.8],
// 3 353 9 0 9 7.4 0 7.8 7.7 0 7.1
  [3,353,9,0,9,7.4,0,7.8,7.7,0,7.1],
// 4 353 9 0 9 7.7 0 7.1 7.8 0 6.3 8.3 0 6
  [4,353,9,0,9,7.7,0,7.1,7.8,0,6.3,8.3,0,6],
// 3 353 9 0 9 8.3 0 6 8.7 0 5.6
  [3,353,9,0,9,8.3,0,6,8.7,0,5.6],
// 3 353 9 0 9 8.7 0 5.6 9 0 4.9
  [3,353,9,0,9,8.7,0,5.6,9,0,4.9],
// 4 191 -5.6 0 3.4 -9 0 3.4 -9 0 2.4 4.5 0 2.4
  [4,191,-5.6,0,3.4,-9,0,3.4,-9,0,2.4,4.5,0,2.4],
// 4 191 -1.6 0 3.9 -5.6 0 3.4 4.5 0 2.4 4.5 0 3.7
  [4,191,-1.6,0,3.9,-5.6,0,3.4,4.5,0,2.4,4.5,0,3.7],
// 4 191 -5.6 0 5 -5.6 0 3.4 -1.6 0 3.9 -2 0 5.9
  [4,191,-5.6,0,5,-5.6,0,3.4,-1.6,0,3.9,-2,0,5.9],
// 3 191 -0.7 0 5.9 -2 0 5.9 -1.6 0 3.9
  [3,191,-0.7,0,5.9,-2,0,5.9,-1.6,0,3.9],
// 4 191 -5.5 0 6.1 -5.6 0 5 -2 0 5.9 -5.3 0 7
  [4,191,-5.5,0,6.1,-5.6,0,5,-2,0,5.9,-5.3,0,7],
// 4 191 -5 0 7.7 -5.3 0 7 -2 0 5.9 -0.9 0 8.1
  [4,191,-5,0,7.7,-5.3,0,7,-2,0,5.9,-0.9,0,8.1],
// 4 191 -4.5 0 8.3 -5 0 7.7 -0.9 0 8.1 -4 0 8.7
  [4,191,-4.5,0,8.3,-5,0,7.7,-0.9,0,8.1,-4,0,8.7],
// 4 191 -3.3 0 9 -4 0 8.7 -0.9 0 8.1 0.5 0 8.1
  [4,191,-3.3,0,9,-4,0,8.7,-0.9,0,8.1,0.5,0,8.1],
// 4 191 5.5 0 9 -3.3 0 9 0.5 0 8.1 6.3 0 8.7
  [4,191,5.5,0,9,-3.3,0,9,0.5,0,8.1,6.3,0,8.7],
// 4 191 1.1 0 6.7 6.3 0 8.7 0.5 0 8.1 0 0 6.7
  [4,191,1.1,0,6.7,6.3,0,8.7,0.5,0,8.1,0,0,6.7],
// 4 191 6.9 0 8.3 6.3 0 8.7 1.1 0 6.7 6 0 6.2
  [4,191,6.9,0,8.3,6.3,0,8.7,1.1,0,6.7,6,0,6.2],
// 4 191 7.4 0 7.8 6.9 0 8.3 6 0 6.2 6.9 0 6.4
  [4,191,7.4,0,7.8,6.9,0,8.3,6,0,6.2,6.9,0,6.4],
// 4 191 7.7 0 7.1 7.4 0 7.8 6.9 0 6.4 7.8 0 6.3
  [4,191,7.7,0,7.1,7.4,0,7.8,6.9,0,6.4,7.8,0,6.3],
// 3 191 1.1 0 6.7 5.4 0 5.8 6 0 6.2
  [3,191,1.1,0,6.7,5.4,0,5.8,6,0,6.2],
// 3 191 1.1 0 6.7 4.9 0 5.3 5.4 0 5.8
  [3,191,1.1,0,6.7,4.9,0,5.3,5.4,0,5.8],
// 3 191 1.1 0 6.7 4.6 0 4.6 4.9 0 5.3
  [3,191,1.1,0,6.7,4.6,0,4.6,4.9,0,5.3],
// 4 191 4.5 0 3.7 4.6 0 4.6 1.1 0 6.7 -1.6 0 3.9
  [4,191,4.5,0,3.7,4.6,0,4.6,1.1,0,6.7,-1.6,0,3.9],
// 4 16 -3.3 0 9 10 0 10 -10 0 10 -9 0 9
  [4,16,-3.3,0,9,10,0,10,-10,0,10,-9,0,9],
// 3 16 -10 0 10 -9 0 5 -9 0 9
  [3,16,-10,0,10,-9,0,5,-9,0,9],
// 3 16 -10 0 10 -9 0 3.4 -9 0 5
  [3,16,-10,0,10,-9,0,3.4,-9,0,5],
// 4 16 -9 0 5 -9 0 3.4 -5.6 0 3.4 -5.6 0 5
  [4,16,-9,0,5,-9,0,3.4,-5.6,0,3.4,-5.6,0,5],
// 4 16 -8.6 0 5.7 -9 0 5 -5.6 0 5 -5.9 0 5.8
  [4,16,-8.6,0,5.7,-9,0,5,-5.6,0,5,-5.9,0,5.8],
// 4 16 -8.1 0 6.2 -8.6 0 5.7 -5.9 0 5.8 -6.3 0 6.2
  [4,16,-8.1,0,6.2,-8.6,0,5.7,-5.9,0,5.8,-6.3,0,6.2],
// 4 16 -7.5 0 6.4 -8.1 0 6.2 -6.3 0 6.2 -6.9 0 6.4
  [4,16,-7.5,0,6.4,-8.1,0,6.2,-6.3,0,6.2,-6.9,0,6.4],
// 4 16 -9 0 2.4 -9 0 3.4 -10 0 10 -10 0 -10
  [4,16,-9,0,2.4,-9,0,3.4,-10,0,10,-10,0,-10],
// 4 16 -4 0 -4.5 -9 0 2.4 -10 0 -10 -3.7 0 -6.03
  [4,16,-4,0,-4.5,-9,0,2.4,-10,0,-10,-3.7,0,-6.03],
// 3 16 -3.7 0 -6.03 -10 0 -10 -2.83 0 -7.33
  [3,16,-3.7,0,-6.03,-10,0,-10,-2.83,0,-7.33],
// 3 16 -2.83 0 -7.33 -10 0 -10 -1.53 0 -8.2
  [3,16,-2.83,0,-7.33,-10,0,-10,-1.53,0,-8.2],
// 3 16 -1.53 0 -8.2 -10 0 -10 0 0 -8.5
  [3,16,-1.53,0,-8.2,-10,0,-10,0,0,-8.5],
// 3 16 0 0 -8.5 -10 0 -10 10 0 -10
  [3,16,0,0,-8.5,-10,0,-10,10,0,-10],
// 3 16 1.53 0 -8.2 0 0 -8.5 10 0 -10
  [3,16,1.53,0,-8.2,0,0,-8.5,10,0,-10],
// 3 16 2.83 0 -7.33 1.53 0 -8.2 10 0 -10
  [3,16,2.83,0,-7.33,1.53,0,-8.2,10,0,-10],
// 3 16 3.7 0 -6.03 2.83 0 -7.33 10 0 -10
  [3,16,3.7,0,-6.03,2.83,0,-7.33,10,0,-10],
// 3 16 4 0 -4.5 3.7 0 -6.03 10 0 -10
  [3,16,4,0,-4.5,3.7,0,-6.03,10,0,-10],
// 4 16 3.9 0 -3.7 4 0 -4.5 10 0 -10 3.9 0 -3.3
  [4,16,3.9,0,-3.7,4,0,-4.5,10,0,-10,3.9,0,-3.3],
// 4 16 4.6 0 -0.6 3.9 0 -3.3 10 0 -10 5 0 -0.4
  [4,16,4.6,0,-0.6,3.9,0,-3.3,10,0,-10,5,0,-0.4],
// 4 16 5.1 0 0 5 0 -0.4 10 0 -10 9 0 4.9
  [4,16,5.1,0,0,5,0,-0.4,10,0,-10,9,0,4.9],
// 4 16 5 0 0.5 5.1 0 0 9 0 4.9 8.7 0 5.6
  [4,16,5,0,0.5,5.1,0,0,9,0,4.9,8.7,0,5.6],
// 4 16 4.7 0 0.9 5 0 0.5 8.7 0 5.6 8.3 0 6
  [4,16,4.7,0,0.9,5,0,0.5,8.7,0,5.6,8.3,0,6],
// 4 16 4.5 0 2.4 4.7 0 0.9 8.3 0 6 7.8 0 6.3
  [4,16,4.5,0,2.4,4.7,0,0.9,8.3,0,6,7.8,0,6.3],
// 4 16 4.5 0 3.7 4.5 0 2.4 7.8 0 6.3 6.9 0 6.4
  [4,16,4.5,0,3.7,4.5,0,2.4,7.8,0,6.3,6.9,0,6.4],
// 4 16 4.6 0 4.6 4.5 0 3.7 6.9 0 6.4 6 0 6.2
  [4,16,4.6,0,4.6,4.5,0,3.7,6.9,0,6.4,6,0,6.2],
// 4 16 4.6 0 4.6 6 0 6.2 5.4 0 5.8 4.9 0 5.3
  [4,16,4.6,0,4.6,6,0,6.2,5.4,0,5.8,4.9,0,5.3],
// 3 16 4.5 0 2.4 4.2 0 1.2 4.7 0 0.9
  [3,16,4.5,0,2.4,4.2,0,1.2,4.7,0,0.9],
// 3 16 4.5 0 2.4 3.6 0 1.3 4.2 0 1.2
  [3,16,4.5,0,2.4,3.6,0,1.3,4.2,0,1.2],
// 4 16 3 0 1.2 3.6 0 1.3 4.5 0 2.4 -2.6 0 1.4
  [4,16,3,0,1.2,3.6,0,1.3,4.5,0,2.4,-2.6,0,1.4],
// 4 16 -2.6 0 1.4 4.5 0 2.4 -9 0 2.4 -3.8 0 1.4
  [4,16,-2.6,0,1.4,4.5,0,2.4,-9,0,2.4,-3.8,0,1.4],
// 3 16 -9 0 2.4 -5 0 1.4 -3.8 0 1.4
  [3,16,-9,0,2.4,-5,0,1.4,-3.8,0,1.4],
// 3 16 -9 0 2.4 -5 0 0.2 -5 0 1.4
  [3,16,-9,0,2.4,-5,0,0.2,-5,0,1.4],
// 3 16 -9 0 2.4 -5 0 -1 -5 0 0.2
  [3,16,-9,0,2.4,-5,0,-1,-5,0,0.2],
// 4 16 -3.9 0 -3.3 -5 0 -1 -9 0 2.4 -3.9 0 -3.7
  [4,16,-3.9,0,-3.3,-5,0,-1,-9,0,2.4,-3.9,0,-3.7],
// 3 16 -9 0 2.4 -4 0 -4.5 -3.9 0 -3.7
  [3,16,-9,0,2.4,-4,0,-4.5,-3.9,0,-3.7],
// 4 16 -5 0 -1 -3.9 0 -3.3 -3.7 0 -2.97 -3.8 0 -1
  [4,16,-5,0,-1,-3.9,0,-3.3,-3.7,0,-2.97,-3.8,0,-1],
// 4 16 -3.8 0 -1 -3.7 0 -2.97 -2.83 0 -1.67 -2.6 0 -1
  [4,16,-3.8,0,-1,-3.7,0,-2.97,-2.83,0,-1.67,-2.6,0,-1],
// 3 16 -1.53 0 -0.8 -2.6 0 -1 -2.83 0 -1.67
  [3,16,-1.53,0,-0.8,-2.6,0,-1,-2.83,0,-1.67],
// 4 16 -2.6 0 0.2 -2.6 0 -1 -1.53 0 -0.8 0 0 -0.5
  [4,16,-2.6,0,0.2,-2.6,0,-1,-1.53,0,-0.8,0,0,-0.5],
// 4 16 -2.6 0 1.4 -2.6 0 0.2 0 0 -0.5 2.2 0 0.5
  [4,16,-2.6,0,1.4,-2.6,0,0.2,0,0,-0.5,2.2,0,0.5],
// 3 16 -2.6 0 1.4 2.2 0 0.5 2.5 0 0.9
  [3,16,-2.6,0,1.4,2.2,0,0.5,2.5,0,0.9],
// 3 16 -2.6 0 1.4 2.5 0 0.9 3 0 1.2
  [3,16,-2.6,0,1.4,2.5,0,0.9,3,0,1.2],
// 4 16 2.1 0 0 2.2 0 0.5 0 0 -0.5 1.53 0 -0.8
  [4,16,2.1,0,0,2.2,0,0.5,0,0,-0.5,1.53,0,-0.8],
// 3 16 2.1 0 0 1.53 0 -0.8 2.2 0 -0.4
  [3,16,2.1,0,0,1.53,0,-0.8,2.2,0,-0.4],
// 4 16 2.6 0 -0.6 2.2 0 -0.4 1.53 0 -0.8 2.83 0 -1.67
  [4,16,2.6,0,-0.6,2.2,0,-0.4,1.53,0,-0.8,2.83,0,-1.67],
// 4 16 3 0 -0.4 2.6 0 -0.6 2.83 0 -1.67 4.2 0 -0.4
  [4,16,3,0,-0.4,2.6,0,-0.6,2.83,0,-1.67,4.2,0,-0.4],
// 4 16 3 0 -0.4 4.2 0 -0.4 4.1 0 0 3.1 0 0
  [4,16,3,0,-0.4,4.2,0,-0.4,4.1,0,0,3.1,0,0],
// 4 16 3.1 0 0 4.1 0 0 3.9 0 0.3 3.3 0 0.3
  [4,16,3.1,0,0,4.1,0,0,3.9,0,0.3,3.3,0,0.3],
// 3 16 3.6 0 0.4 3.3 0 0.3 3.9 0 0.3
  [3,16,3.6,0,0.4,3.3,0,0.3,3.9,0,0.3],
// 4 16 4.6 0 -0.6 4.2 0 -0.4 2.83 0 -1.67 3.7 0 -2.97
  [4,16,4.6,0,-0.6,4.2,0,-0.4,2.83,0,-1.67,3.7,0,-2.97],
// 3 16 4.6 0 -0.6 3.7 0 -2.97 3.9 0 -3.3
  [3,16,4.6,0,-0.6,3.7,0,-2.97,3.9,0,-3.3],
// 4 16 9 0 4.9 10 0 -10 10 0 10 9 0 9
  [4,16,9,0,4.9,10,0,-10,10,0,10,9,0,9],
// 3 16 10 0 10 5.5 0 9 9 0 9
  [3,16,10,0,10,5.5,0,9,9,0,9],
// 3 16 10 0 10 -3.3 0 9 5.5 0 9
  [3,16,10,0,10,-3.3,0,9,5.5,0,9],
];
module ldraw_lib__3070bp1g(step=0, col=false, unit=2/5, alt=false, line=0.2, solid=!$preview)
    makepoly(ldraw_lib__3070bp1g(), step=step, col=col, unit=unit, alt=alt, line=line, solid=solid);
ldraw_lib__3070bp1g(line=0.2);
